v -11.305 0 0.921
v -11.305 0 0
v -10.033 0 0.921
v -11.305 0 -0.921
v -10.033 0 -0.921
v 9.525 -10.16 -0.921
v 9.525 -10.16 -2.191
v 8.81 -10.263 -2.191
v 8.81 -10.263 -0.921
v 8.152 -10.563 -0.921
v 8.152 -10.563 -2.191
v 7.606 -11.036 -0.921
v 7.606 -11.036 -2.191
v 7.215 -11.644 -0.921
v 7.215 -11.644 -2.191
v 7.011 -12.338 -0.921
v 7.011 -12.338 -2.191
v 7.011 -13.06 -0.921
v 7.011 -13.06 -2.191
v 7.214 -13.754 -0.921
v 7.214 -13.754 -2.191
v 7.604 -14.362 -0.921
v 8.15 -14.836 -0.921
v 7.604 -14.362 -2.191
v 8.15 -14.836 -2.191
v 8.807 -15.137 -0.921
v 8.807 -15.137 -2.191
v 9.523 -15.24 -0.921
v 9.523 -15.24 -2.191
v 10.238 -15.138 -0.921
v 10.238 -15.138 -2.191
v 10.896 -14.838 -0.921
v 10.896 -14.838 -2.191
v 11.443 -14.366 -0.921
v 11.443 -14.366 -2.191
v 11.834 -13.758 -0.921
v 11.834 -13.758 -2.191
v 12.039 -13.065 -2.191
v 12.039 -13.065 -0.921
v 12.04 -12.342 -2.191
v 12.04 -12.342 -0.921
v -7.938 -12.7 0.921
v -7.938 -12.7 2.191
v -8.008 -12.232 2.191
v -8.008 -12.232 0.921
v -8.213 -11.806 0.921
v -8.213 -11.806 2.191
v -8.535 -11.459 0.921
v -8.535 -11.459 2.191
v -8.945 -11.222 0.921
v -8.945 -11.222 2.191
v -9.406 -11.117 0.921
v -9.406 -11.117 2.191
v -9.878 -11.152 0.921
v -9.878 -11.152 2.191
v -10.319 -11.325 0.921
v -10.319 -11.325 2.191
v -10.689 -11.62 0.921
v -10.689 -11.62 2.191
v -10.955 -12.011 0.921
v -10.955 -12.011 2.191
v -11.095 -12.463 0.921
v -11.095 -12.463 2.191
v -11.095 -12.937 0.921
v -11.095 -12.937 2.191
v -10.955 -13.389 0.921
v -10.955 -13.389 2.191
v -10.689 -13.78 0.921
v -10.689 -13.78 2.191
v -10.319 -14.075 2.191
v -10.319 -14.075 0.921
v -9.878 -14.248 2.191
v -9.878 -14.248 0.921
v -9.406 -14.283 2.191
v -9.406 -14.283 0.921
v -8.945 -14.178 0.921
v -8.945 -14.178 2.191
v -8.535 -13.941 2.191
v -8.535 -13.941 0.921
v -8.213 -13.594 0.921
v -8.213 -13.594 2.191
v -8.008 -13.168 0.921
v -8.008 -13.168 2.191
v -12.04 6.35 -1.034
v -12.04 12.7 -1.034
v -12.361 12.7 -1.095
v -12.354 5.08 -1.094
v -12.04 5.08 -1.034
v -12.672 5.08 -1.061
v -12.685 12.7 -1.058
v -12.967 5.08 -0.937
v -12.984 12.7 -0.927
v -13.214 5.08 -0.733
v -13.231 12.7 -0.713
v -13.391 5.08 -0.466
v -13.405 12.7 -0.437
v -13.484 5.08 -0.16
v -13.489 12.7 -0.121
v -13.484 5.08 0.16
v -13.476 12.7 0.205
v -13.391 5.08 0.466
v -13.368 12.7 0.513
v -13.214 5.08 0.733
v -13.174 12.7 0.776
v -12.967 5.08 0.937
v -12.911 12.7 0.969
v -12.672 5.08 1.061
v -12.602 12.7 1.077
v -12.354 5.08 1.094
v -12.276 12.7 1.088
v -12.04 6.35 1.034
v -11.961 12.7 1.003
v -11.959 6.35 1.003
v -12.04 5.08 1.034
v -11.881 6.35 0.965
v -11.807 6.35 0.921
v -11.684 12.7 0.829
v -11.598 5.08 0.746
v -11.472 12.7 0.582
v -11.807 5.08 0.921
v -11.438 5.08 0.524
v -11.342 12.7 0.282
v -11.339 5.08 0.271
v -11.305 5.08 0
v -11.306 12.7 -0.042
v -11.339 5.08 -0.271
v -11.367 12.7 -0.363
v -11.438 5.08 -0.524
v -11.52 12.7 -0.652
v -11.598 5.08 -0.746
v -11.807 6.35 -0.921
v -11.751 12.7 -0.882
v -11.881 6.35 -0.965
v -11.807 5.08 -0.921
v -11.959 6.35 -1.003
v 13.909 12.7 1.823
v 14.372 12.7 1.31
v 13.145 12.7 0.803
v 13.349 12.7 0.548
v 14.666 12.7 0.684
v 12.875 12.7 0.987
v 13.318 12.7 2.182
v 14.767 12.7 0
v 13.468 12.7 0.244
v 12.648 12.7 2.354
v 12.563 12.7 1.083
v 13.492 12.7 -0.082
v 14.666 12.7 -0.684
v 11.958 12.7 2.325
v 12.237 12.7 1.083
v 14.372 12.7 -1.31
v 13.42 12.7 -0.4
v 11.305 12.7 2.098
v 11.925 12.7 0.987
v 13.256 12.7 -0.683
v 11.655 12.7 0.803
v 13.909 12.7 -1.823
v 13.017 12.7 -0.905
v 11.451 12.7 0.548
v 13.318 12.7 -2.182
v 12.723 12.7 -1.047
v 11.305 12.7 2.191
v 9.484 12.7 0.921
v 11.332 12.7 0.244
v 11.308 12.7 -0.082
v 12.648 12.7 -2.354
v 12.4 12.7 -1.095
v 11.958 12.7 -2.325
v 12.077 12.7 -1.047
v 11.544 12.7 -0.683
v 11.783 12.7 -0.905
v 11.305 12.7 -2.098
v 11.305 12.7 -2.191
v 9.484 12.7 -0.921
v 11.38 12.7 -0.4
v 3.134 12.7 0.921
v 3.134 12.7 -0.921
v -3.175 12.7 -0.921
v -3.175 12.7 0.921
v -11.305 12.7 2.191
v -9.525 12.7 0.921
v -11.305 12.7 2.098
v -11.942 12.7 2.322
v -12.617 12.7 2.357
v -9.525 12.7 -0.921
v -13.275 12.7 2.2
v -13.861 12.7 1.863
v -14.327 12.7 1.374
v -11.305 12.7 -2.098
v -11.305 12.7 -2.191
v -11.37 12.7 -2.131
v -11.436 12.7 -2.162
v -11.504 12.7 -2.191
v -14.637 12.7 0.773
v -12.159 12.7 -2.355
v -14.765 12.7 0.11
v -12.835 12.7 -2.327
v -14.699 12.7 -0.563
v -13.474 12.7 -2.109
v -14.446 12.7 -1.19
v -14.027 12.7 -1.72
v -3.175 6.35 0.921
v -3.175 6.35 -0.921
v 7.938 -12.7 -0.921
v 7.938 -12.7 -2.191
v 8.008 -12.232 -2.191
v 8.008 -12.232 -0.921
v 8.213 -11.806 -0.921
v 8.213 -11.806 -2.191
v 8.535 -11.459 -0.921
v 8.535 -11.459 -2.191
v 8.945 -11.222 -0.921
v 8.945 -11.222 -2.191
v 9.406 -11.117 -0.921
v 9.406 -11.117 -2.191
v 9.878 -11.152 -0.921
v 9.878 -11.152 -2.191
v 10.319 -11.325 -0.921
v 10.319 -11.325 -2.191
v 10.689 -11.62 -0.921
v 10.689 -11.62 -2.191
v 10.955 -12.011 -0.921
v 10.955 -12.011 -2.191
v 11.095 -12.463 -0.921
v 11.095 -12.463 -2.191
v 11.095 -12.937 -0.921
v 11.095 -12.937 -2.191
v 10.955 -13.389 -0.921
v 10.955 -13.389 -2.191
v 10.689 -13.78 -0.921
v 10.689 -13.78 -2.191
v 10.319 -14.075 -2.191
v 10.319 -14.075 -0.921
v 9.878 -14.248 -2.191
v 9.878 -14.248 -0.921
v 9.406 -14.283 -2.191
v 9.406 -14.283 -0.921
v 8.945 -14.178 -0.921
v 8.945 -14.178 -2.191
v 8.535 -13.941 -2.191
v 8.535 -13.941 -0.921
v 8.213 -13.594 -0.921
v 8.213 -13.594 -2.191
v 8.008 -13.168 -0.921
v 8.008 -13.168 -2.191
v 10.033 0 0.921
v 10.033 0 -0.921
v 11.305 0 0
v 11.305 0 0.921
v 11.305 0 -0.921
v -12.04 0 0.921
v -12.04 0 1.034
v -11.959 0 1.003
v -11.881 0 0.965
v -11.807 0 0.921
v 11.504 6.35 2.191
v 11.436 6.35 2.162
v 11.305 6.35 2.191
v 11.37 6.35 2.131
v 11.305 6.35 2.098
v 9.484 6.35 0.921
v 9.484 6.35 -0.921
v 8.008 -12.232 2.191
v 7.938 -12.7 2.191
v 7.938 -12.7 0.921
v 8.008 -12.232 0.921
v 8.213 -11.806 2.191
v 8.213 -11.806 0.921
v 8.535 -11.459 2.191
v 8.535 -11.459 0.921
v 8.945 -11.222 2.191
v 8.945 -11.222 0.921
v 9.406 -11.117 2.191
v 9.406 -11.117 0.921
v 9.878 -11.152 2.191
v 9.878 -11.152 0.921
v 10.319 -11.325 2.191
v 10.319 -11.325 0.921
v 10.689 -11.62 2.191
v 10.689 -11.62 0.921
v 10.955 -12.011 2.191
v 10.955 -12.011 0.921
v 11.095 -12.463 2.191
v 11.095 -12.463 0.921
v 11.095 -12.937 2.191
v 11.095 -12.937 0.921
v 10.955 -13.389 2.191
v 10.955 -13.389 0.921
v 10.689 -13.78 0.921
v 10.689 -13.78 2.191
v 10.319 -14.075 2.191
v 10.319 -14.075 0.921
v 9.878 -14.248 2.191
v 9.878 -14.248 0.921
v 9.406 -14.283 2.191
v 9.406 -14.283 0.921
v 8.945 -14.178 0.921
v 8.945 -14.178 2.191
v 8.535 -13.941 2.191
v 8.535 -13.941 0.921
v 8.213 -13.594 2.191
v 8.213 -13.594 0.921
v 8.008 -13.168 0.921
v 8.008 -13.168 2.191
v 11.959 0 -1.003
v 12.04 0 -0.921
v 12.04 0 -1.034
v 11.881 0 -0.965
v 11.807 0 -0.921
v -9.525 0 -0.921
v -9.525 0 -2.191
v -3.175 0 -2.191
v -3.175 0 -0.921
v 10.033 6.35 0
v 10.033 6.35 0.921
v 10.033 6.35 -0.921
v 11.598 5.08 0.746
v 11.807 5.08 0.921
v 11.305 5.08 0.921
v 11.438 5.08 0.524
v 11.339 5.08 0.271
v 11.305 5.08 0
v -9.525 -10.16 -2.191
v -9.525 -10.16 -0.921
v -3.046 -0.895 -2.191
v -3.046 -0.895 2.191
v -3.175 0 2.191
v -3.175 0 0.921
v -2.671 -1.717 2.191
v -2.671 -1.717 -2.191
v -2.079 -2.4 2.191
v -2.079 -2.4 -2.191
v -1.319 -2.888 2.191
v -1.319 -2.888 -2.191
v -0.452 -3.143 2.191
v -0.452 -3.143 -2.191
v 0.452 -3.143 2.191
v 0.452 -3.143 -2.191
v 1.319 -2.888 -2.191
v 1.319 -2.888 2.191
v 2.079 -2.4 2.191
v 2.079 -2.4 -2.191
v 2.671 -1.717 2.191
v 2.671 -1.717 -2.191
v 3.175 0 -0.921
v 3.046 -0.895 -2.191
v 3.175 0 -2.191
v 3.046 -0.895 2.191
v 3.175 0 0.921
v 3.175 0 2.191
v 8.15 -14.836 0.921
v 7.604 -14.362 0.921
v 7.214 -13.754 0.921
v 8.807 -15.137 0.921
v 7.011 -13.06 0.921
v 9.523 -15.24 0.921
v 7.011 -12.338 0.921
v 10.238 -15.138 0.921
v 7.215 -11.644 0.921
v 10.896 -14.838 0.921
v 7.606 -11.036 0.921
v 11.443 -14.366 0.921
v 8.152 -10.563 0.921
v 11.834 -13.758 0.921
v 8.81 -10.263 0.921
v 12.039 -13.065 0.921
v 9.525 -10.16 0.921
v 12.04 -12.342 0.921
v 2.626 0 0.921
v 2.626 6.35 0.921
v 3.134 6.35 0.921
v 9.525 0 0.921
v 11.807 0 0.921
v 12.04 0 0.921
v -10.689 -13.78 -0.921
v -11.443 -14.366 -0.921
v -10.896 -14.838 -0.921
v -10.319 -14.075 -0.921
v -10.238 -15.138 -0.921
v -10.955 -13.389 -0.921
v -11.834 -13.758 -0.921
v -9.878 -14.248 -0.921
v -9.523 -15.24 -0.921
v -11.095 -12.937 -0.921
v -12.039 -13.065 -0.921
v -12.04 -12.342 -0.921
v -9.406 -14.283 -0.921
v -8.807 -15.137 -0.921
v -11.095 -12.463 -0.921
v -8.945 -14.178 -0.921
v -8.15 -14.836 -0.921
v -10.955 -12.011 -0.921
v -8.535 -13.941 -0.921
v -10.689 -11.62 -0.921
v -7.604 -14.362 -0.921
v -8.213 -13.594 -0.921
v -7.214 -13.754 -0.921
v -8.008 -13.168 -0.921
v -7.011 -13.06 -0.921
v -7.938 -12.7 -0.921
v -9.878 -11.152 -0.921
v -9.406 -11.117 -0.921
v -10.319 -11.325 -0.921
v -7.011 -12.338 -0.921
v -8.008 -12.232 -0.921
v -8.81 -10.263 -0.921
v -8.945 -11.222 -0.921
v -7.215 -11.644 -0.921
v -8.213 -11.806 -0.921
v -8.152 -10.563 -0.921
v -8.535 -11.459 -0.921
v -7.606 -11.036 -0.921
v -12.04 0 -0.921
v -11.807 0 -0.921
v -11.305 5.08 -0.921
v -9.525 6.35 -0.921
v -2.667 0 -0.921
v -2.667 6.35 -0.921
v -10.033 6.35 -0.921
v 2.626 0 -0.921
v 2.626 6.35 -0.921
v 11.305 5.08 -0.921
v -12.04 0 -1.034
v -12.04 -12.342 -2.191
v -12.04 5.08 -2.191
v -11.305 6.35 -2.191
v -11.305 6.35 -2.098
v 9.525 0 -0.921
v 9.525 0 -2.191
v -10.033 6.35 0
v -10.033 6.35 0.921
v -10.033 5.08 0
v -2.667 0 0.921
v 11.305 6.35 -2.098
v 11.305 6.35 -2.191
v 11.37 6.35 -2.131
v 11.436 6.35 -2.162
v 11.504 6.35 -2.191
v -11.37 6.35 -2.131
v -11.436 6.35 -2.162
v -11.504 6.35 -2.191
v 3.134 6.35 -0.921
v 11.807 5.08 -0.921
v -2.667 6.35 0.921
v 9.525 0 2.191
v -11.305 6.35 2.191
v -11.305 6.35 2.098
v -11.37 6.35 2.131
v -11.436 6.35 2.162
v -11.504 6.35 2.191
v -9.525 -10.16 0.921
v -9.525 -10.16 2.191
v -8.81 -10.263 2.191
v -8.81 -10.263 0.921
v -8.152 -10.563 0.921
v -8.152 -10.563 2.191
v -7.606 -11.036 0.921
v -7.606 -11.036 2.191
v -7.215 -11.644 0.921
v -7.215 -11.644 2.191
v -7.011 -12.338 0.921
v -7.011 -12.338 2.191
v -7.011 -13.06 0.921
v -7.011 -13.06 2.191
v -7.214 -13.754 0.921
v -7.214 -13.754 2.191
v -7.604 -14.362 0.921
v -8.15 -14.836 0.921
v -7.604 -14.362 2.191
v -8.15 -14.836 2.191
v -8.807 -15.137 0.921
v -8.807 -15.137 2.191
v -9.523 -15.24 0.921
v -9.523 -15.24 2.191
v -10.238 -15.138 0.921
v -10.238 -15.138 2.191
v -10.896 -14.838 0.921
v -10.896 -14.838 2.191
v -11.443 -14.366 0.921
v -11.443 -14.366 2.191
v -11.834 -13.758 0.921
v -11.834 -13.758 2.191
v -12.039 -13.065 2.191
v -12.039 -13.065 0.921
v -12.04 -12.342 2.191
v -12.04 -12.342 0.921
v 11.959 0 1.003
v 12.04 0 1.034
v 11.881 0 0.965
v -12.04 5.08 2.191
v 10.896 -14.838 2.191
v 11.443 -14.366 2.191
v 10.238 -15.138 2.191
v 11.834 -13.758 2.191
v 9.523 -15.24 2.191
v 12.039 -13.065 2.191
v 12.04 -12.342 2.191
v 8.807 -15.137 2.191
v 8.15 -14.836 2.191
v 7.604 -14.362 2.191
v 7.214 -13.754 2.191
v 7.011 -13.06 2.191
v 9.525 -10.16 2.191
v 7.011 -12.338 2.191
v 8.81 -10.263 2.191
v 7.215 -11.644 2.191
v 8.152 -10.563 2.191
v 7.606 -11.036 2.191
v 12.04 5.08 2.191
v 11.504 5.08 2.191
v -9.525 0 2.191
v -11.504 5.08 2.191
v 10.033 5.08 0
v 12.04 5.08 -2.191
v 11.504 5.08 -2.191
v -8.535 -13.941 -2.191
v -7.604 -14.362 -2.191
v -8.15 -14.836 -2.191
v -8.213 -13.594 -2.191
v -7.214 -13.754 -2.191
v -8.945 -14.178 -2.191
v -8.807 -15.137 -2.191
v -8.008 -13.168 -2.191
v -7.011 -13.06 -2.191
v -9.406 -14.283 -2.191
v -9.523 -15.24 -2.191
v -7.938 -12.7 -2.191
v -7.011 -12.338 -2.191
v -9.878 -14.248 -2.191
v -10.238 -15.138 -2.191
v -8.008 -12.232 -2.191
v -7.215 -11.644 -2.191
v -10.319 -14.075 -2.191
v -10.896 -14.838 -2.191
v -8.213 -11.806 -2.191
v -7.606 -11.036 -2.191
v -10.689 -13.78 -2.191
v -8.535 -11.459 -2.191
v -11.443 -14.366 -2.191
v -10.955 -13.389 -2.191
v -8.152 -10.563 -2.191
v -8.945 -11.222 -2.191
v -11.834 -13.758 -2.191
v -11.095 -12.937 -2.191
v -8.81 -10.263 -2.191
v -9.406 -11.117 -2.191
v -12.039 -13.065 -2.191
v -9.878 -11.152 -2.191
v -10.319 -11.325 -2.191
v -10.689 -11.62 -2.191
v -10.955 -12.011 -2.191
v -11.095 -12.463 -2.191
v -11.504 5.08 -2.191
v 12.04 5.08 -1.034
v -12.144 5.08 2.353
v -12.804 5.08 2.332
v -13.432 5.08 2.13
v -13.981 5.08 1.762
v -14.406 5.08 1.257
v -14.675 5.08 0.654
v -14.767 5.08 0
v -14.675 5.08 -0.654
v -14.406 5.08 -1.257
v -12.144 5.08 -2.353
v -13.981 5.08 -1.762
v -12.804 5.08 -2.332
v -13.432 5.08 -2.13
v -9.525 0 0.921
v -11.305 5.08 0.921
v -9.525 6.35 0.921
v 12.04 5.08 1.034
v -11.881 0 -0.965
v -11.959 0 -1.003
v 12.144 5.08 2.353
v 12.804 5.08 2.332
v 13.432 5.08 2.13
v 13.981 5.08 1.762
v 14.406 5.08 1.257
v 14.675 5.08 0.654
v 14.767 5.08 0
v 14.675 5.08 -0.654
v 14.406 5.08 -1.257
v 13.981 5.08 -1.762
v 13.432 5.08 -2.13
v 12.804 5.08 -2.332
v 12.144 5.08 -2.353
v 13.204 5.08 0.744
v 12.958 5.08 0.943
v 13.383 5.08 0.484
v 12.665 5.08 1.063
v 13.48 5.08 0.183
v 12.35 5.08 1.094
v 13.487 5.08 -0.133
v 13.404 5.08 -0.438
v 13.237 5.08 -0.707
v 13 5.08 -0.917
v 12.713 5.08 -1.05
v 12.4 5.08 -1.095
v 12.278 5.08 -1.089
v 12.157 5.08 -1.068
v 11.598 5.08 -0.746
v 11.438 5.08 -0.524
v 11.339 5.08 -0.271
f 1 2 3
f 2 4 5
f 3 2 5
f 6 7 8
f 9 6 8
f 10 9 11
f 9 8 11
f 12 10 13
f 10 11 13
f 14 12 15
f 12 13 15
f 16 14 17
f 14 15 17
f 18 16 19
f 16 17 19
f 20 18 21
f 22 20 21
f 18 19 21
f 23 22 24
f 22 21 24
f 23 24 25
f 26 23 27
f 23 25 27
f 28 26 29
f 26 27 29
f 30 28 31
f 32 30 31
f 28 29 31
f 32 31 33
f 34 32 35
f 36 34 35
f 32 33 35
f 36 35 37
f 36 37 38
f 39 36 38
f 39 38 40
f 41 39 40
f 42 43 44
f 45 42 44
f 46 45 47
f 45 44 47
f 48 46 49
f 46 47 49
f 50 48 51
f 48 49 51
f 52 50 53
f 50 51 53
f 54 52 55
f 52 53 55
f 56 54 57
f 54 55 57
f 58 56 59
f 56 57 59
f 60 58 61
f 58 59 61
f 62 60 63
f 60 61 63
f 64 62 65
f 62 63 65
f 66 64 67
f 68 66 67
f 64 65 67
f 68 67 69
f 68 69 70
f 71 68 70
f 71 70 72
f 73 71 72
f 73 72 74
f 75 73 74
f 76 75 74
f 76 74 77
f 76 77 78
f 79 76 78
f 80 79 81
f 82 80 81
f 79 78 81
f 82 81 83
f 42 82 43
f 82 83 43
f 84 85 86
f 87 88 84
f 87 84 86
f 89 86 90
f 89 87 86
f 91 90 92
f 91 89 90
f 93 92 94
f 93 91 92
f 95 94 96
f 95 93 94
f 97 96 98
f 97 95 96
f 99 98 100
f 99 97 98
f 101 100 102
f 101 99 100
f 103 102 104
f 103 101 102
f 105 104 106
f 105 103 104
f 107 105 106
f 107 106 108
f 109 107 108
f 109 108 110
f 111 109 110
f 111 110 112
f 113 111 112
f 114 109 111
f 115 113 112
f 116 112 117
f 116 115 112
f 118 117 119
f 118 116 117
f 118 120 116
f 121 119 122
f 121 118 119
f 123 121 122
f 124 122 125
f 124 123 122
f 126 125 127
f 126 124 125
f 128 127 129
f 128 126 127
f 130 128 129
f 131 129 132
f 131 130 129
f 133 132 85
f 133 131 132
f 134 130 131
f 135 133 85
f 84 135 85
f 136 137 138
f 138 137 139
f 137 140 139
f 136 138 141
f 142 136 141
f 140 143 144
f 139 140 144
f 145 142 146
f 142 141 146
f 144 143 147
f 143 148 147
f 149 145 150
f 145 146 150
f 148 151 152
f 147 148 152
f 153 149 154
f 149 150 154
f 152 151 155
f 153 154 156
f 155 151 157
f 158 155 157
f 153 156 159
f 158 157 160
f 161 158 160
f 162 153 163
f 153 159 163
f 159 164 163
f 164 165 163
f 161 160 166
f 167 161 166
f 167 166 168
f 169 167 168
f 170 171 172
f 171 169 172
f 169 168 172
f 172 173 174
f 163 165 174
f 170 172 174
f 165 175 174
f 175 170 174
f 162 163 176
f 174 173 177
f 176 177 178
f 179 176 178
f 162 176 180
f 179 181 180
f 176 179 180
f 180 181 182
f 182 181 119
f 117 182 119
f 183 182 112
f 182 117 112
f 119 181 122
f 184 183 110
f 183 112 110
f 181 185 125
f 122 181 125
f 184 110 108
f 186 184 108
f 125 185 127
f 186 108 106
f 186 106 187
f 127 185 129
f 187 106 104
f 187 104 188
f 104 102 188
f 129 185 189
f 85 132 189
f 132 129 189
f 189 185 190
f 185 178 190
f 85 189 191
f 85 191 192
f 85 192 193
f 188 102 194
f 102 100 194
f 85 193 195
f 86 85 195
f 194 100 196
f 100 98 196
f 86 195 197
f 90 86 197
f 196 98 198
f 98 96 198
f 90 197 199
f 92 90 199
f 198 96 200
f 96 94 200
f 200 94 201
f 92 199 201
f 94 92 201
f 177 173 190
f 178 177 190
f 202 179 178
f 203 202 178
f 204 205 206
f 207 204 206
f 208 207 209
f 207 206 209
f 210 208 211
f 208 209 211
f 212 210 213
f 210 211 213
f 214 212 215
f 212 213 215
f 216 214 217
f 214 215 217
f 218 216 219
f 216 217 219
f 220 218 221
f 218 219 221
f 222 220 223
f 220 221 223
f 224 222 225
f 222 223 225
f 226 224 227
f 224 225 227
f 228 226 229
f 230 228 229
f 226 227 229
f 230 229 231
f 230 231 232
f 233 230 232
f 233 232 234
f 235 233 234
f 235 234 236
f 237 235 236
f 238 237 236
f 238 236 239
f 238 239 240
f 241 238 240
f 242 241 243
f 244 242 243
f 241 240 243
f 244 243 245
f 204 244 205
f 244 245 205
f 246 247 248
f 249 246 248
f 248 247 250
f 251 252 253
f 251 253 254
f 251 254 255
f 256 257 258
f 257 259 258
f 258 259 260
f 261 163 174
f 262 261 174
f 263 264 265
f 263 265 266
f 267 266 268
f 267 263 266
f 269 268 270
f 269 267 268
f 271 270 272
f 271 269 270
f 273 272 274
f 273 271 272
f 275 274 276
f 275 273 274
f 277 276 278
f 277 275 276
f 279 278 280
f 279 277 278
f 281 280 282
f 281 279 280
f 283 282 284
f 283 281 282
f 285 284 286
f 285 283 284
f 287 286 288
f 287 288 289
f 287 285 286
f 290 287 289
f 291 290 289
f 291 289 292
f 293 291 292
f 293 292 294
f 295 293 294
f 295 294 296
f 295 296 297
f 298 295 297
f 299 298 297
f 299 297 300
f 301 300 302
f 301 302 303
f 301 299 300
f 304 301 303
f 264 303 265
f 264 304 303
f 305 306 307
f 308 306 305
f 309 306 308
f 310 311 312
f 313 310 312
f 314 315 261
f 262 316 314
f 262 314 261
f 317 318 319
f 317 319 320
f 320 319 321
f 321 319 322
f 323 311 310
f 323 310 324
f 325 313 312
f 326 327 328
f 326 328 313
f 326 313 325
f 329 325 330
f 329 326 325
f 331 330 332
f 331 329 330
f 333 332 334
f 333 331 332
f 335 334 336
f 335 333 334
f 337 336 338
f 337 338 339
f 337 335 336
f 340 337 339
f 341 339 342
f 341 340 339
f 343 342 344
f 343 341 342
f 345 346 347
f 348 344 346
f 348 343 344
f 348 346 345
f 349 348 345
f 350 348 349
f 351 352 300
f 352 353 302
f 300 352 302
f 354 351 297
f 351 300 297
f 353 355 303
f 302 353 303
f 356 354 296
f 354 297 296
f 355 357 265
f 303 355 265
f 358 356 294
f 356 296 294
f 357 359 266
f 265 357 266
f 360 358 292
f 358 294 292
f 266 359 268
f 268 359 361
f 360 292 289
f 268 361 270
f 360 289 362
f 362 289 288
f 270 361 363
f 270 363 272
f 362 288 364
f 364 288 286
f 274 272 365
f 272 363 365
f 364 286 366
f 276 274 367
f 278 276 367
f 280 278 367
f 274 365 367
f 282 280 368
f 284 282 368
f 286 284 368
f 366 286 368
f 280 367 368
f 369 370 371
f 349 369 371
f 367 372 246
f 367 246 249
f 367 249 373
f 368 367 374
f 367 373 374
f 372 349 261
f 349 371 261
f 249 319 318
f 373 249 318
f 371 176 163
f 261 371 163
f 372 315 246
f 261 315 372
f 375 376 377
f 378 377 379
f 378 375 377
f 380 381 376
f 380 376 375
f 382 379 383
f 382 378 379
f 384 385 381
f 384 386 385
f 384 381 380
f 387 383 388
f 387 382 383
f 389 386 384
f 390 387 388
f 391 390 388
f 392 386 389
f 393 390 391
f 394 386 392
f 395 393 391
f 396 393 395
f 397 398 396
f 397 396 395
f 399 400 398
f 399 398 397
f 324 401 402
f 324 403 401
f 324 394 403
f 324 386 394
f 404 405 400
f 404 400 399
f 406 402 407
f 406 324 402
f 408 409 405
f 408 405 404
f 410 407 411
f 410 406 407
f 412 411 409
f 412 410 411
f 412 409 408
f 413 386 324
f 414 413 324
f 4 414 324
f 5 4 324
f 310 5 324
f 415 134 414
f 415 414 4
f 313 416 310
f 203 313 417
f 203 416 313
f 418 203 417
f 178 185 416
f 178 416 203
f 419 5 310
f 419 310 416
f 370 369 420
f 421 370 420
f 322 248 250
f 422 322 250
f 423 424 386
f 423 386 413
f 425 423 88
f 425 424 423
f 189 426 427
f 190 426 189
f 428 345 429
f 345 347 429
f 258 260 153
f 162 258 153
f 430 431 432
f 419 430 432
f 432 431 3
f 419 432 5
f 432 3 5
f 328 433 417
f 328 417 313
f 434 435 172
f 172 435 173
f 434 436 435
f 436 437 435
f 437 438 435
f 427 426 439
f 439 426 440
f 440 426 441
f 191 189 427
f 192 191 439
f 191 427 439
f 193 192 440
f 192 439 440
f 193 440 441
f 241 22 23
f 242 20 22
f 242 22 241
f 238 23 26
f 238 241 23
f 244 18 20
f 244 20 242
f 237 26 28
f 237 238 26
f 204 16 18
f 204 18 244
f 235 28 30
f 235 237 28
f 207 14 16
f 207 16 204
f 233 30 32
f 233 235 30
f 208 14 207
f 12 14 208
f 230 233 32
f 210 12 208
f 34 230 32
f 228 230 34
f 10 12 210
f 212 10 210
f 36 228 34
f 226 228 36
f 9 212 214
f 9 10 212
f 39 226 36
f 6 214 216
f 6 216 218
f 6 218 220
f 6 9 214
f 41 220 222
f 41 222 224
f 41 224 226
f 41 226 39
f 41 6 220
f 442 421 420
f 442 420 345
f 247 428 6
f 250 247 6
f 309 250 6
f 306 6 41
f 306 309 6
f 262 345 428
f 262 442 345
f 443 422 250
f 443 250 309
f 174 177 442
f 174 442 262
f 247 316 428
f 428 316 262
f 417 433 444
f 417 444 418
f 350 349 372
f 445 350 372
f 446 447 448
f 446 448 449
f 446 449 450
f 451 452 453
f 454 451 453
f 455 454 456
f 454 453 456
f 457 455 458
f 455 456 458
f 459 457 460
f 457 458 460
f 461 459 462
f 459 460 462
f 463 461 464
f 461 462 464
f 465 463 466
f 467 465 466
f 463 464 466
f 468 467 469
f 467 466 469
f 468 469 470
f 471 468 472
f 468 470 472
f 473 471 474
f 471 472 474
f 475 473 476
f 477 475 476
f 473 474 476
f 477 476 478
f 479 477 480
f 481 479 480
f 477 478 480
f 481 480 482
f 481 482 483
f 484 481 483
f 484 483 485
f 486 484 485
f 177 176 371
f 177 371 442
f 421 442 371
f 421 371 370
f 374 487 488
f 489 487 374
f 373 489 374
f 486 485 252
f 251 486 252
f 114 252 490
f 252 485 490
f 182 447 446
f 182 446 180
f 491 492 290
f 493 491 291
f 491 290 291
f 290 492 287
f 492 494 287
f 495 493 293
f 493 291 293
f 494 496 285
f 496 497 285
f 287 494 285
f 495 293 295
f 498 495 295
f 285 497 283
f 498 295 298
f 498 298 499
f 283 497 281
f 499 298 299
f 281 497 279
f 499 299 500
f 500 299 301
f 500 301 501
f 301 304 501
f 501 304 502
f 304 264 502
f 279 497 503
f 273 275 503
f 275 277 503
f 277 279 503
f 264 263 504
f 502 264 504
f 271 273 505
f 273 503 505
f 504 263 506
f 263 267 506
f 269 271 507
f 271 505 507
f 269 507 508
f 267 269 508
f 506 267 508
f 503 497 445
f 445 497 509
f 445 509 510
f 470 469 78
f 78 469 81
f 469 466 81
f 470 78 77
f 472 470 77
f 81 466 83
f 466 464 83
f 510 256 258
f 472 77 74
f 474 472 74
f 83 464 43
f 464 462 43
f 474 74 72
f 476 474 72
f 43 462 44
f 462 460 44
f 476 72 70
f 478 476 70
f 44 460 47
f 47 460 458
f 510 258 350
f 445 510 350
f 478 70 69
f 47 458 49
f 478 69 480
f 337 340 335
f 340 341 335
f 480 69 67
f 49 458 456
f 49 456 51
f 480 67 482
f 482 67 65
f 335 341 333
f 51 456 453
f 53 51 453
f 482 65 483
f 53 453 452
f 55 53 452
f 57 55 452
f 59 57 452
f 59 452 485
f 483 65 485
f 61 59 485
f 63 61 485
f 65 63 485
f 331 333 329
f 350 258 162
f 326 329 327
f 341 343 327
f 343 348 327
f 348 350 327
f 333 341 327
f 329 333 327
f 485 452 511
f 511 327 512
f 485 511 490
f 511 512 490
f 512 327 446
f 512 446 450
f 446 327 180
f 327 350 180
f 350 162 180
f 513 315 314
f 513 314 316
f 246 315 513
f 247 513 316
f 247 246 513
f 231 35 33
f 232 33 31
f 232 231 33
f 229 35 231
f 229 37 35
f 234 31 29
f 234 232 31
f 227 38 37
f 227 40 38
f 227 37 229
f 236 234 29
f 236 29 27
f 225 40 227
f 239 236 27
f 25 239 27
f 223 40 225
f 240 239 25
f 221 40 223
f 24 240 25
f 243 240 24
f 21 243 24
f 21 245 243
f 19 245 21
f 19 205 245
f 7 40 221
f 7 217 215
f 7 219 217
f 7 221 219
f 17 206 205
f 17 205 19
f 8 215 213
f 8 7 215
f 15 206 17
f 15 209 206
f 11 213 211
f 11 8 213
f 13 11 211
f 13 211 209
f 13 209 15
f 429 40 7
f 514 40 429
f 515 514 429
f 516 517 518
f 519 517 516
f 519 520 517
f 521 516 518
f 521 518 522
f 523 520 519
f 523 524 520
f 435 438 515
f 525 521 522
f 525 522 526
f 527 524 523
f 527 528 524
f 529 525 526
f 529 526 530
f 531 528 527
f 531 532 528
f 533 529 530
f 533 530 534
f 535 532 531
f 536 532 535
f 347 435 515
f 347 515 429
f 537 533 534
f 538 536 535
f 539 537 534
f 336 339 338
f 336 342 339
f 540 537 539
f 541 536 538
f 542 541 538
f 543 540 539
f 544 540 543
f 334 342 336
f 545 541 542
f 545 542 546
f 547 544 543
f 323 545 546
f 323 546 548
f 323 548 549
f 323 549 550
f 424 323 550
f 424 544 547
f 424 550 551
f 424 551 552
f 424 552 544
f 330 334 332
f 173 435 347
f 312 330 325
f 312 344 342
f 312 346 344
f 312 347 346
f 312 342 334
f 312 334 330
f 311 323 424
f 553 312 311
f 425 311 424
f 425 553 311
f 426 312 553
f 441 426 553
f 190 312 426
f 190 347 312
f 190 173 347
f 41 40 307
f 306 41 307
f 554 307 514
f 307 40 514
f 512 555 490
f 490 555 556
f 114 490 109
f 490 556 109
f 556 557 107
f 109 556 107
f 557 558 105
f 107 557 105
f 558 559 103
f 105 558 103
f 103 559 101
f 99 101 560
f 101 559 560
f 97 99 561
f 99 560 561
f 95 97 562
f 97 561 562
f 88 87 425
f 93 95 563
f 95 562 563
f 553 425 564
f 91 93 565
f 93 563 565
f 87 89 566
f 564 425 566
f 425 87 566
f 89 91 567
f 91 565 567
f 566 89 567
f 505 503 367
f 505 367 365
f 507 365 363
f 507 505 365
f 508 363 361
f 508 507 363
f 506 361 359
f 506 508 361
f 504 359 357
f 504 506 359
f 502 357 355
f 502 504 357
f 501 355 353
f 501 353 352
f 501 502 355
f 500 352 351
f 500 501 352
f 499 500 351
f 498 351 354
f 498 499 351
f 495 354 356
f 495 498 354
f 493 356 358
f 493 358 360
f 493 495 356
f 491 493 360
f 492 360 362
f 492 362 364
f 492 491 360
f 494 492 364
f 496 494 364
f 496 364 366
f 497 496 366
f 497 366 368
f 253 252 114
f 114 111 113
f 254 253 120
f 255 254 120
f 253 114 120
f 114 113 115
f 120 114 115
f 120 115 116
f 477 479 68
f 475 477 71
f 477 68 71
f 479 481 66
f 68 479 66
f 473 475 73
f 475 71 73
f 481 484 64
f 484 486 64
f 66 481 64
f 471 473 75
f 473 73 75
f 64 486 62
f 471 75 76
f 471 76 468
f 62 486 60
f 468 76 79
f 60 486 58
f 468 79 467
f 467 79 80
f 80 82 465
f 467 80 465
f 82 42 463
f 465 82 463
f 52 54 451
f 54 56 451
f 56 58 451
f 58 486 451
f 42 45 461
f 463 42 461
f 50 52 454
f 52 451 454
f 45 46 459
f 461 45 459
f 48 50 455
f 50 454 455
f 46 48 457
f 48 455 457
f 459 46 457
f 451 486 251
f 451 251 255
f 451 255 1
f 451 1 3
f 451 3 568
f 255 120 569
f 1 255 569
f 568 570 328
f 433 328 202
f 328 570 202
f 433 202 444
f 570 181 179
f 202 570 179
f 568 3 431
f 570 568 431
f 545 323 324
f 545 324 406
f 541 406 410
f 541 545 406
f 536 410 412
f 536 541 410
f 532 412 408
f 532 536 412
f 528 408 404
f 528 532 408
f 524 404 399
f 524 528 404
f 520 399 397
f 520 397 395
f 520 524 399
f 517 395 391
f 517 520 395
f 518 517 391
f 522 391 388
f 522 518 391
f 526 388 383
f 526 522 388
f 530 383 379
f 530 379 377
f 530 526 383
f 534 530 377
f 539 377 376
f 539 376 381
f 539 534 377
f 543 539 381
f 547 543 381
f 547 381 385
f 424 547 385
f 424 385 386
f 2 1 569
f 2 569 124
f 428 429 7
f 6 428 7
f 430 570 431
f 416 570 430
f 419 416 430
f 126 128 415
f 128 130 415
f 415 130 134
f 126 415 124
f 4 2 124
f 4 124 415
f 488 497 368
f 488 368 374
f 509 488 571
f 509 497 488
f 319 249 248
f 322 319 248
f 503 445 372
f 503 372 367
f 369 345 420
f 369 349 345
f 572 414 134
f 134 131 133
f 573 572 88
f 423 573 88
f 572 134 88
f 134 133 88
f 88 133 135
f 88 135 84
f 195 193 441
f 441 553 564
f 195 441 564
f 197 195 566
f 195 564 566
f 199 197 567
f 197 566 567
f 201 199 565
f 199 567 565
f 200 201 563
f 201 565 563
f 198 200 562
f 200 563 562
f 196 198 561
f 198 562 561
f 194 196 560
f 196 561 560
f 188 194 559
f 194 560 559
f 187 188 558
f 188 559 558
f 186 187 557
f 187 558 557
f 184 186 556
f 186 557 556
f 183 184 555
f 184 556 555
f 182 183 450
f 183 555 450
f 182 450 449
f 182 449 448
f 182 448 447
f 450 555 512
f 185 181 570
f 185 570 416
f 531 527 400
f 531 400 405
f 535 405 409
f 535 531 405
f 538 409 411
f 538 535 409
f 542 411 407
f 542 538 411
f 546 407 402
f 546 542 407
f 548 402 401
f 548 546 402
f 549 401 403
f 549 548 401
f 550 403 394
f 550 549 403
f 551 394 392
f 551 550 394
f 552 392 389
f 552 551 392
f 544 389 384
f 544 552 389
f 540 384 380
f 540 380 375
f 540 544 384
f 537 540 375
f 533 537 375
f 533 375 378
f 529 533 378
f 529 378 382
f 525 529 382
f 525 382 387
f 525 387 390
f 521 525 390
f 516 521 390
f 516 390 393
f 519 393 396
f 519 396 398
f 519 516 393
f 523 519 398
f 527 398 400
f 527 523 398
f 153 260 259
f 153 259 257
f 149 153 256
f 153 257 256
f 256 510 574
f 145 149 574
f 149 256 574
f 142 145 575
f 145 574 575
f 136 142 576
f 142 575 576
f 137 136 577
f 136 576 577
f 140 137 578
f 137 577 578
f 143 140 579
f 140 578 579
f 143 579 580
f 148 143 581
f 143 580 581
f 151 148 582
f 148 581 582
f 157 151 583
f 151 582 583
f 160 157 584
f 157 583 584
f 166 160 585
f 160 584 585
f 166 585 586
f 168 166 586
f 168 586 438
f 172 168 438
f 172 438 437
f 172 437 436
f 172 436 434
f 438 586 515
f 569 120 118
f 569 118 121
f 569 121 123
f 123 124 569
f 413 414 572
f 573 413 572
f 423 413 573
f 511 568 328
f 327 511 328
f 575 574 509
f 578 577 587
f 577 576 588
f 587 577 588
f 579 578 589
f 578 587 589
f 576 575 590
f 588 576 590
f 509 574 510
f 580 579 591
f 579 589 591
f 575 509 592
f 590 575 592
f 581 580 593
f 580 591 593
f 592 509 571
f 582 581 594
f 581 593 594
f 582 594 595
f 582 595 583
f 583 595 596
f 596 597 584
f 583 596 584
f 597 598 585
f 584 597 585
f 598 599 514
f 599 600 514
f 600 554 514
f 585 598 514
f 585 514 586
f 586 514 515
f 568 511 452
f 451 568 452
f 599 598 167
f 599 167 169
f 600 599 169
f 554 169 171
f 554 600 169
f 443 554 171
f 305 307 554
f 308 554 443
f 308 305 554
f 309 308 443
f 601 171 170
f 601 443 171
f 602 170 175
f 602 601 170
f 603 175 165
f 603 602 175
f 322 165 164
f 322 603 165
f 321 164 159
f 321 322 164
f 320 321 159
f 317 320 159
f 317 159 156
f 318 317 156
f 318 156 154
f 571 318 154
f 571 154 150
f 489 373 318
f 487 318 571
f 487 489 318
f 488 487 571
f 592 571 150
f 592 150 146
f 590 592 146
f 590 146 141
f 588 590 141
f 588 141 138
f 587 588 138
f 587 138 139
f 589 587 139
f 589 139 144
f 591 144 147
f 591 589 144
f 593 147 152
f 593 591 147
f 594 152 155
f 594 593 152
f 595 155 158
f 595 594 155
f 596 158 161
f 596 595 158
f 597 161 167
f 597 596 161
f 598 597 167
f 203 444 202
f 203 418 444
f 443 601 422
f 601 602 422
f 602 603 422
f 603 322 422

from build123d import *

# Parameters (mm, degrees)
SKETCH1_W                = 22.609360872
SKETCH1_H                = 4.3815
SKETCH1_W_2              = 7.366
SKETCH1_H_2              = 1.8415
SKETCH1_W_3              = 7.407296779
BOSS_EXTRUDE1_DEPTH      = 6.35
BOSS_EXTRUDE2_REACH      = 15.15
BOSS_EXTRUDE3_START      = 2.19075
BOSS_EXTRUDE3_DEPTH      = 2.19075
SKETCH7_R                = 1.5875
BOSS_EXTRUDE4_DEPTH      = 1.27
MIRROR2_COPY_1_SKETCH_R  = 1.5875
MIRROR2_COPY_1_DEPTH     = 1.27
BOSS_EXTRUDE5_DEPTH      = 6.35
BOSS_EXTRUDE5_DEPTH_BACK = 1.27
SKETCH8_R                = 2.367055436
SKETCH8_R_2              = 1.095375
SKETCH9_W                = 22.609360872
SKETCH9_H                = 6.35
BOSS_EXTRUDE6_DEPTH      = 4.3815
SKETCH10_W               = 6.35
SKETCH10_H               = 1.8415
CUT_EXTRUDE1_DEPTH       = 12.7
SKETCH12_R               = 1.095375
CUT_EXTRUDE2_DEPTH       = 12.7


with BuildPart() as part:
    # Sketch1 → Boss-Extrude1 (new body)
    with BuildSketch(Plane(origin=(0, 0, 0), x_dir=(1, 0, 0), z_dir=(0, 1, 0))):
        Rectangle(SKETCH1_W, SKETCH1_H)
        with Locations((-6.35, 0)):
            Rectangle(SKETCH1_W_2, SKETCH1_H_2, mode=Mode.SUBTRACT)
        with Locations((6.329351611, 0)):
            Rectangle(SKETCH1_W_3, SKETCH1_H_2, mode=Mode.SUBTRACT)
    extrude(amount=BOSS_EXTRUDE1_DEPTH)

    # Boss-Extrude2: up to this face of the body (flat: up to its plane)
    boss_extrude2_end = Plane(part.part.faces().sort_by_distance((0, 3.175, -2.19075))[0])
    # Sketch2 → Boss-Extrude2 (add, up to the picked face)
    with BuildSketch(Plane.XY, mode=Mode.PRIVATE) as boss_extrude2_sk1:
        with BuildLine():
            Line((3.175, 0), (-3.175, 0))
            ThreePointArc((-3.175, 0), (0, -3.175), (3.175, 0))
        make_face()
    boss_extrude2_tool1 = split(extrude(boss_extrude2_sk1.sketch, amount=-BOSS_EXTRUDE2_REACH, mode=Mode.PRIVATE), bisect_by=boss_extrude2_end, keep=Keep.BOTH, mode=Mode.PRIVATE)
    add(boss_extrude2_tool1.solids().sort_by(Axis((0, -1.347512, 0), (0, 0, -1)))[0])

    # Sketch2<3> → Boss-Extrude3 (add)
    with BuildSketch(Plane.XY.offset(BOSS_EXTRUDE3_START)):
        with BuildLine():
            Line((3.175, 0), (-3.175, 0))
            ThreePointArc((-3.175, 0), (0, -3.175), (3.175, 0))
        make_face()
    extrude(amount=-BOSS_EXTRUDE3_DEPTH)

    # Sketch7 → Boss-Extrude4 (add)
    with BuildSketch(Plane.XY.offset(2.19075)):
        with BuildLine():
            Line((-9.525, 0), (-9.525, -10.16))
            ThreePointArc((-9.525, -10.16), (-7.860334077, -14.618459634), (-12.039641241, -12.341978452))
            Line((-12.039641241, -12.341978452), (-12.039641241, 0))
            Line((-12.039641241, 0), (-12.039641241, 6.35))
            Line((-12.039641241, 6.35), (-11.304680436, 6.35))
            Line((-11.304680436, 6.35), (-11.304680436, 0))
            Line((-11.304680436, 0), (-9.525, 0))
        make_face()
        with Locations((-9.525, -12.7)):
            Circle(SKETCH7_R, mode=Mode.SUBTRACT)
    boss_extrude4 = extrude(amount=-BOSS_EXTRUDE4_DEPTH)

    # Mirror1: Boss-Extrude4 across plane
    add(boss_extrude4.mirror(Plane(origin=(0, 0, 0), x_dir=(0, 0, 1), z_dir=(1, 0, 0))))

    # Mirror2: Boss-Extrude4 across plane
    add(boss_extrude4.mirror(Plane.XY))

    # Mirror2 copy 1 sketch → Mirror2 copy 1 (add)
    with BuildSketch(Plane(origin=(0, 0, -2.19075), x_dir=(-1, 0, 0), z_dir=(0, 0, -1))):
        with BuildLine():
            Line((-9.525, 0), (-9.525, -10.16))
            ThreePointArc((-9.525, -10.16), (-7.860334077, -14.618459634), (-12.039641241, -12.341978452))
            Line((-12.039641241, -12.341978452), (-12.039641241, 0))
            Line((-12.039641241, 0), (-12.039641241, 6.35))
            Line((-12.039641241, 6.35), (-11.304680436, 6.35))
            Line((-11.304680436, 6.35), (-11.304680436, 0))
            Line((-11.304680436, 0), (-9.525, 0))
        make_face()
        with Locations((-9.525, -12.7)):
            Circle(MIRROR2_COPY_1_SKETCH_R, mode=Mode.SUBTRACT)
    extrude(amount=-MIRROR2_COPY_1_DEPTH)

    # Sketch8 → Boss-Extrude5 (add, two sides: drawn at the far end of the back side and taken through both)
    # profile 1 of 2: a face of its own
    with BuildSketch(Plane(origin=(0, 6.35, 0), x_dir=(1, 0, 0), z_dir=(0, 1, 0)).offset(-BOSS_EXTRUDE5_DEPTH_BACK)):
        with Locations(Location((-12.400055436, 0, 0), (0, 0, 67.746440803))):
            Circle(SKETCH8_R)
        with Locations(Location((-12.400055436, 0, 0), (0, 0, 70.789925107))):
            Circle(SKETCH8_R_2, mode=Mode.SUBTRACT)
    # profile 2 of 2: a face of its own
    with BuildSketch(Plane(origin=(0, 6.35, 0), x_dir=(1, 0, 0), z_dir=(0, 1, 0)).offset(-BOSS_EXTRUDE5_DEPTH_BACK)):
        with Locations(Location((12.400055436, 0, 0), (0, 0, 90))):
            Circle(SKETCH8_R)
        with Locations(Location((12.400055436, 0, 0), (0, 0, 90))):
            Circle(SKETCH8_R_2, mode=Mode.SUBTRACT)
    extrude(amount=BOSS_EXTRUDE5_DEPTH + BOSS_EXTRUDE5_DEPTH_BACK)

    # Sketch9 → Boss-Extrude6 (add)
    with BuildSketch(Plane(origin=(0, 0, -2.19075), x_dir=(-1, 0, 0), z_dir=(0, 0, -1))):
        with Locations((0, 9.525)):
            Rectangle(SKETCH9_W, SKETCH9_H)
    extrude(amount=-BOSS_EXTRUDE6_DEPTH)

    # Sketch10 → Cut-Extrude1 (cut)
    with BuildSketch(Plane(origin=(0, 12.7, 0), x_dir=(1, 0, 0), z_dir=(0, 1, 0))):
        with Locations((6.308703221, 0)):
            Rectangle(SKETCH10_W, SKETCH10_H)
        with Locations((-6.35, 0)):
            Rectangle(SKETCH10_W, SKETCH10_H)
    extrude(amount=-CUT_EXTRUDE1_DEPTH, mode=Mode.SUBTRACT)

    # Sketch12 → Cut-Extrude2 (cut)
    with BuildSketch(Plane(origin=(0, 12.7, 0), x_dir=(1, 0, 0), z_dir=(0, 1, 0))):
        with Locations(Location((-12.400055436, 0, 0), (0, 0, 70.789925107))):
            Circle(SKETCH12_R)
        with Locations(Location((12.400055436, 0, 0), (0, 0, 90))):
            Circle(SKETCH12_R)
    extrude(amount=-CUT_EXTRUDE2_DEPTH, mode=Mode.SUBTRACT)


solid = part.part
